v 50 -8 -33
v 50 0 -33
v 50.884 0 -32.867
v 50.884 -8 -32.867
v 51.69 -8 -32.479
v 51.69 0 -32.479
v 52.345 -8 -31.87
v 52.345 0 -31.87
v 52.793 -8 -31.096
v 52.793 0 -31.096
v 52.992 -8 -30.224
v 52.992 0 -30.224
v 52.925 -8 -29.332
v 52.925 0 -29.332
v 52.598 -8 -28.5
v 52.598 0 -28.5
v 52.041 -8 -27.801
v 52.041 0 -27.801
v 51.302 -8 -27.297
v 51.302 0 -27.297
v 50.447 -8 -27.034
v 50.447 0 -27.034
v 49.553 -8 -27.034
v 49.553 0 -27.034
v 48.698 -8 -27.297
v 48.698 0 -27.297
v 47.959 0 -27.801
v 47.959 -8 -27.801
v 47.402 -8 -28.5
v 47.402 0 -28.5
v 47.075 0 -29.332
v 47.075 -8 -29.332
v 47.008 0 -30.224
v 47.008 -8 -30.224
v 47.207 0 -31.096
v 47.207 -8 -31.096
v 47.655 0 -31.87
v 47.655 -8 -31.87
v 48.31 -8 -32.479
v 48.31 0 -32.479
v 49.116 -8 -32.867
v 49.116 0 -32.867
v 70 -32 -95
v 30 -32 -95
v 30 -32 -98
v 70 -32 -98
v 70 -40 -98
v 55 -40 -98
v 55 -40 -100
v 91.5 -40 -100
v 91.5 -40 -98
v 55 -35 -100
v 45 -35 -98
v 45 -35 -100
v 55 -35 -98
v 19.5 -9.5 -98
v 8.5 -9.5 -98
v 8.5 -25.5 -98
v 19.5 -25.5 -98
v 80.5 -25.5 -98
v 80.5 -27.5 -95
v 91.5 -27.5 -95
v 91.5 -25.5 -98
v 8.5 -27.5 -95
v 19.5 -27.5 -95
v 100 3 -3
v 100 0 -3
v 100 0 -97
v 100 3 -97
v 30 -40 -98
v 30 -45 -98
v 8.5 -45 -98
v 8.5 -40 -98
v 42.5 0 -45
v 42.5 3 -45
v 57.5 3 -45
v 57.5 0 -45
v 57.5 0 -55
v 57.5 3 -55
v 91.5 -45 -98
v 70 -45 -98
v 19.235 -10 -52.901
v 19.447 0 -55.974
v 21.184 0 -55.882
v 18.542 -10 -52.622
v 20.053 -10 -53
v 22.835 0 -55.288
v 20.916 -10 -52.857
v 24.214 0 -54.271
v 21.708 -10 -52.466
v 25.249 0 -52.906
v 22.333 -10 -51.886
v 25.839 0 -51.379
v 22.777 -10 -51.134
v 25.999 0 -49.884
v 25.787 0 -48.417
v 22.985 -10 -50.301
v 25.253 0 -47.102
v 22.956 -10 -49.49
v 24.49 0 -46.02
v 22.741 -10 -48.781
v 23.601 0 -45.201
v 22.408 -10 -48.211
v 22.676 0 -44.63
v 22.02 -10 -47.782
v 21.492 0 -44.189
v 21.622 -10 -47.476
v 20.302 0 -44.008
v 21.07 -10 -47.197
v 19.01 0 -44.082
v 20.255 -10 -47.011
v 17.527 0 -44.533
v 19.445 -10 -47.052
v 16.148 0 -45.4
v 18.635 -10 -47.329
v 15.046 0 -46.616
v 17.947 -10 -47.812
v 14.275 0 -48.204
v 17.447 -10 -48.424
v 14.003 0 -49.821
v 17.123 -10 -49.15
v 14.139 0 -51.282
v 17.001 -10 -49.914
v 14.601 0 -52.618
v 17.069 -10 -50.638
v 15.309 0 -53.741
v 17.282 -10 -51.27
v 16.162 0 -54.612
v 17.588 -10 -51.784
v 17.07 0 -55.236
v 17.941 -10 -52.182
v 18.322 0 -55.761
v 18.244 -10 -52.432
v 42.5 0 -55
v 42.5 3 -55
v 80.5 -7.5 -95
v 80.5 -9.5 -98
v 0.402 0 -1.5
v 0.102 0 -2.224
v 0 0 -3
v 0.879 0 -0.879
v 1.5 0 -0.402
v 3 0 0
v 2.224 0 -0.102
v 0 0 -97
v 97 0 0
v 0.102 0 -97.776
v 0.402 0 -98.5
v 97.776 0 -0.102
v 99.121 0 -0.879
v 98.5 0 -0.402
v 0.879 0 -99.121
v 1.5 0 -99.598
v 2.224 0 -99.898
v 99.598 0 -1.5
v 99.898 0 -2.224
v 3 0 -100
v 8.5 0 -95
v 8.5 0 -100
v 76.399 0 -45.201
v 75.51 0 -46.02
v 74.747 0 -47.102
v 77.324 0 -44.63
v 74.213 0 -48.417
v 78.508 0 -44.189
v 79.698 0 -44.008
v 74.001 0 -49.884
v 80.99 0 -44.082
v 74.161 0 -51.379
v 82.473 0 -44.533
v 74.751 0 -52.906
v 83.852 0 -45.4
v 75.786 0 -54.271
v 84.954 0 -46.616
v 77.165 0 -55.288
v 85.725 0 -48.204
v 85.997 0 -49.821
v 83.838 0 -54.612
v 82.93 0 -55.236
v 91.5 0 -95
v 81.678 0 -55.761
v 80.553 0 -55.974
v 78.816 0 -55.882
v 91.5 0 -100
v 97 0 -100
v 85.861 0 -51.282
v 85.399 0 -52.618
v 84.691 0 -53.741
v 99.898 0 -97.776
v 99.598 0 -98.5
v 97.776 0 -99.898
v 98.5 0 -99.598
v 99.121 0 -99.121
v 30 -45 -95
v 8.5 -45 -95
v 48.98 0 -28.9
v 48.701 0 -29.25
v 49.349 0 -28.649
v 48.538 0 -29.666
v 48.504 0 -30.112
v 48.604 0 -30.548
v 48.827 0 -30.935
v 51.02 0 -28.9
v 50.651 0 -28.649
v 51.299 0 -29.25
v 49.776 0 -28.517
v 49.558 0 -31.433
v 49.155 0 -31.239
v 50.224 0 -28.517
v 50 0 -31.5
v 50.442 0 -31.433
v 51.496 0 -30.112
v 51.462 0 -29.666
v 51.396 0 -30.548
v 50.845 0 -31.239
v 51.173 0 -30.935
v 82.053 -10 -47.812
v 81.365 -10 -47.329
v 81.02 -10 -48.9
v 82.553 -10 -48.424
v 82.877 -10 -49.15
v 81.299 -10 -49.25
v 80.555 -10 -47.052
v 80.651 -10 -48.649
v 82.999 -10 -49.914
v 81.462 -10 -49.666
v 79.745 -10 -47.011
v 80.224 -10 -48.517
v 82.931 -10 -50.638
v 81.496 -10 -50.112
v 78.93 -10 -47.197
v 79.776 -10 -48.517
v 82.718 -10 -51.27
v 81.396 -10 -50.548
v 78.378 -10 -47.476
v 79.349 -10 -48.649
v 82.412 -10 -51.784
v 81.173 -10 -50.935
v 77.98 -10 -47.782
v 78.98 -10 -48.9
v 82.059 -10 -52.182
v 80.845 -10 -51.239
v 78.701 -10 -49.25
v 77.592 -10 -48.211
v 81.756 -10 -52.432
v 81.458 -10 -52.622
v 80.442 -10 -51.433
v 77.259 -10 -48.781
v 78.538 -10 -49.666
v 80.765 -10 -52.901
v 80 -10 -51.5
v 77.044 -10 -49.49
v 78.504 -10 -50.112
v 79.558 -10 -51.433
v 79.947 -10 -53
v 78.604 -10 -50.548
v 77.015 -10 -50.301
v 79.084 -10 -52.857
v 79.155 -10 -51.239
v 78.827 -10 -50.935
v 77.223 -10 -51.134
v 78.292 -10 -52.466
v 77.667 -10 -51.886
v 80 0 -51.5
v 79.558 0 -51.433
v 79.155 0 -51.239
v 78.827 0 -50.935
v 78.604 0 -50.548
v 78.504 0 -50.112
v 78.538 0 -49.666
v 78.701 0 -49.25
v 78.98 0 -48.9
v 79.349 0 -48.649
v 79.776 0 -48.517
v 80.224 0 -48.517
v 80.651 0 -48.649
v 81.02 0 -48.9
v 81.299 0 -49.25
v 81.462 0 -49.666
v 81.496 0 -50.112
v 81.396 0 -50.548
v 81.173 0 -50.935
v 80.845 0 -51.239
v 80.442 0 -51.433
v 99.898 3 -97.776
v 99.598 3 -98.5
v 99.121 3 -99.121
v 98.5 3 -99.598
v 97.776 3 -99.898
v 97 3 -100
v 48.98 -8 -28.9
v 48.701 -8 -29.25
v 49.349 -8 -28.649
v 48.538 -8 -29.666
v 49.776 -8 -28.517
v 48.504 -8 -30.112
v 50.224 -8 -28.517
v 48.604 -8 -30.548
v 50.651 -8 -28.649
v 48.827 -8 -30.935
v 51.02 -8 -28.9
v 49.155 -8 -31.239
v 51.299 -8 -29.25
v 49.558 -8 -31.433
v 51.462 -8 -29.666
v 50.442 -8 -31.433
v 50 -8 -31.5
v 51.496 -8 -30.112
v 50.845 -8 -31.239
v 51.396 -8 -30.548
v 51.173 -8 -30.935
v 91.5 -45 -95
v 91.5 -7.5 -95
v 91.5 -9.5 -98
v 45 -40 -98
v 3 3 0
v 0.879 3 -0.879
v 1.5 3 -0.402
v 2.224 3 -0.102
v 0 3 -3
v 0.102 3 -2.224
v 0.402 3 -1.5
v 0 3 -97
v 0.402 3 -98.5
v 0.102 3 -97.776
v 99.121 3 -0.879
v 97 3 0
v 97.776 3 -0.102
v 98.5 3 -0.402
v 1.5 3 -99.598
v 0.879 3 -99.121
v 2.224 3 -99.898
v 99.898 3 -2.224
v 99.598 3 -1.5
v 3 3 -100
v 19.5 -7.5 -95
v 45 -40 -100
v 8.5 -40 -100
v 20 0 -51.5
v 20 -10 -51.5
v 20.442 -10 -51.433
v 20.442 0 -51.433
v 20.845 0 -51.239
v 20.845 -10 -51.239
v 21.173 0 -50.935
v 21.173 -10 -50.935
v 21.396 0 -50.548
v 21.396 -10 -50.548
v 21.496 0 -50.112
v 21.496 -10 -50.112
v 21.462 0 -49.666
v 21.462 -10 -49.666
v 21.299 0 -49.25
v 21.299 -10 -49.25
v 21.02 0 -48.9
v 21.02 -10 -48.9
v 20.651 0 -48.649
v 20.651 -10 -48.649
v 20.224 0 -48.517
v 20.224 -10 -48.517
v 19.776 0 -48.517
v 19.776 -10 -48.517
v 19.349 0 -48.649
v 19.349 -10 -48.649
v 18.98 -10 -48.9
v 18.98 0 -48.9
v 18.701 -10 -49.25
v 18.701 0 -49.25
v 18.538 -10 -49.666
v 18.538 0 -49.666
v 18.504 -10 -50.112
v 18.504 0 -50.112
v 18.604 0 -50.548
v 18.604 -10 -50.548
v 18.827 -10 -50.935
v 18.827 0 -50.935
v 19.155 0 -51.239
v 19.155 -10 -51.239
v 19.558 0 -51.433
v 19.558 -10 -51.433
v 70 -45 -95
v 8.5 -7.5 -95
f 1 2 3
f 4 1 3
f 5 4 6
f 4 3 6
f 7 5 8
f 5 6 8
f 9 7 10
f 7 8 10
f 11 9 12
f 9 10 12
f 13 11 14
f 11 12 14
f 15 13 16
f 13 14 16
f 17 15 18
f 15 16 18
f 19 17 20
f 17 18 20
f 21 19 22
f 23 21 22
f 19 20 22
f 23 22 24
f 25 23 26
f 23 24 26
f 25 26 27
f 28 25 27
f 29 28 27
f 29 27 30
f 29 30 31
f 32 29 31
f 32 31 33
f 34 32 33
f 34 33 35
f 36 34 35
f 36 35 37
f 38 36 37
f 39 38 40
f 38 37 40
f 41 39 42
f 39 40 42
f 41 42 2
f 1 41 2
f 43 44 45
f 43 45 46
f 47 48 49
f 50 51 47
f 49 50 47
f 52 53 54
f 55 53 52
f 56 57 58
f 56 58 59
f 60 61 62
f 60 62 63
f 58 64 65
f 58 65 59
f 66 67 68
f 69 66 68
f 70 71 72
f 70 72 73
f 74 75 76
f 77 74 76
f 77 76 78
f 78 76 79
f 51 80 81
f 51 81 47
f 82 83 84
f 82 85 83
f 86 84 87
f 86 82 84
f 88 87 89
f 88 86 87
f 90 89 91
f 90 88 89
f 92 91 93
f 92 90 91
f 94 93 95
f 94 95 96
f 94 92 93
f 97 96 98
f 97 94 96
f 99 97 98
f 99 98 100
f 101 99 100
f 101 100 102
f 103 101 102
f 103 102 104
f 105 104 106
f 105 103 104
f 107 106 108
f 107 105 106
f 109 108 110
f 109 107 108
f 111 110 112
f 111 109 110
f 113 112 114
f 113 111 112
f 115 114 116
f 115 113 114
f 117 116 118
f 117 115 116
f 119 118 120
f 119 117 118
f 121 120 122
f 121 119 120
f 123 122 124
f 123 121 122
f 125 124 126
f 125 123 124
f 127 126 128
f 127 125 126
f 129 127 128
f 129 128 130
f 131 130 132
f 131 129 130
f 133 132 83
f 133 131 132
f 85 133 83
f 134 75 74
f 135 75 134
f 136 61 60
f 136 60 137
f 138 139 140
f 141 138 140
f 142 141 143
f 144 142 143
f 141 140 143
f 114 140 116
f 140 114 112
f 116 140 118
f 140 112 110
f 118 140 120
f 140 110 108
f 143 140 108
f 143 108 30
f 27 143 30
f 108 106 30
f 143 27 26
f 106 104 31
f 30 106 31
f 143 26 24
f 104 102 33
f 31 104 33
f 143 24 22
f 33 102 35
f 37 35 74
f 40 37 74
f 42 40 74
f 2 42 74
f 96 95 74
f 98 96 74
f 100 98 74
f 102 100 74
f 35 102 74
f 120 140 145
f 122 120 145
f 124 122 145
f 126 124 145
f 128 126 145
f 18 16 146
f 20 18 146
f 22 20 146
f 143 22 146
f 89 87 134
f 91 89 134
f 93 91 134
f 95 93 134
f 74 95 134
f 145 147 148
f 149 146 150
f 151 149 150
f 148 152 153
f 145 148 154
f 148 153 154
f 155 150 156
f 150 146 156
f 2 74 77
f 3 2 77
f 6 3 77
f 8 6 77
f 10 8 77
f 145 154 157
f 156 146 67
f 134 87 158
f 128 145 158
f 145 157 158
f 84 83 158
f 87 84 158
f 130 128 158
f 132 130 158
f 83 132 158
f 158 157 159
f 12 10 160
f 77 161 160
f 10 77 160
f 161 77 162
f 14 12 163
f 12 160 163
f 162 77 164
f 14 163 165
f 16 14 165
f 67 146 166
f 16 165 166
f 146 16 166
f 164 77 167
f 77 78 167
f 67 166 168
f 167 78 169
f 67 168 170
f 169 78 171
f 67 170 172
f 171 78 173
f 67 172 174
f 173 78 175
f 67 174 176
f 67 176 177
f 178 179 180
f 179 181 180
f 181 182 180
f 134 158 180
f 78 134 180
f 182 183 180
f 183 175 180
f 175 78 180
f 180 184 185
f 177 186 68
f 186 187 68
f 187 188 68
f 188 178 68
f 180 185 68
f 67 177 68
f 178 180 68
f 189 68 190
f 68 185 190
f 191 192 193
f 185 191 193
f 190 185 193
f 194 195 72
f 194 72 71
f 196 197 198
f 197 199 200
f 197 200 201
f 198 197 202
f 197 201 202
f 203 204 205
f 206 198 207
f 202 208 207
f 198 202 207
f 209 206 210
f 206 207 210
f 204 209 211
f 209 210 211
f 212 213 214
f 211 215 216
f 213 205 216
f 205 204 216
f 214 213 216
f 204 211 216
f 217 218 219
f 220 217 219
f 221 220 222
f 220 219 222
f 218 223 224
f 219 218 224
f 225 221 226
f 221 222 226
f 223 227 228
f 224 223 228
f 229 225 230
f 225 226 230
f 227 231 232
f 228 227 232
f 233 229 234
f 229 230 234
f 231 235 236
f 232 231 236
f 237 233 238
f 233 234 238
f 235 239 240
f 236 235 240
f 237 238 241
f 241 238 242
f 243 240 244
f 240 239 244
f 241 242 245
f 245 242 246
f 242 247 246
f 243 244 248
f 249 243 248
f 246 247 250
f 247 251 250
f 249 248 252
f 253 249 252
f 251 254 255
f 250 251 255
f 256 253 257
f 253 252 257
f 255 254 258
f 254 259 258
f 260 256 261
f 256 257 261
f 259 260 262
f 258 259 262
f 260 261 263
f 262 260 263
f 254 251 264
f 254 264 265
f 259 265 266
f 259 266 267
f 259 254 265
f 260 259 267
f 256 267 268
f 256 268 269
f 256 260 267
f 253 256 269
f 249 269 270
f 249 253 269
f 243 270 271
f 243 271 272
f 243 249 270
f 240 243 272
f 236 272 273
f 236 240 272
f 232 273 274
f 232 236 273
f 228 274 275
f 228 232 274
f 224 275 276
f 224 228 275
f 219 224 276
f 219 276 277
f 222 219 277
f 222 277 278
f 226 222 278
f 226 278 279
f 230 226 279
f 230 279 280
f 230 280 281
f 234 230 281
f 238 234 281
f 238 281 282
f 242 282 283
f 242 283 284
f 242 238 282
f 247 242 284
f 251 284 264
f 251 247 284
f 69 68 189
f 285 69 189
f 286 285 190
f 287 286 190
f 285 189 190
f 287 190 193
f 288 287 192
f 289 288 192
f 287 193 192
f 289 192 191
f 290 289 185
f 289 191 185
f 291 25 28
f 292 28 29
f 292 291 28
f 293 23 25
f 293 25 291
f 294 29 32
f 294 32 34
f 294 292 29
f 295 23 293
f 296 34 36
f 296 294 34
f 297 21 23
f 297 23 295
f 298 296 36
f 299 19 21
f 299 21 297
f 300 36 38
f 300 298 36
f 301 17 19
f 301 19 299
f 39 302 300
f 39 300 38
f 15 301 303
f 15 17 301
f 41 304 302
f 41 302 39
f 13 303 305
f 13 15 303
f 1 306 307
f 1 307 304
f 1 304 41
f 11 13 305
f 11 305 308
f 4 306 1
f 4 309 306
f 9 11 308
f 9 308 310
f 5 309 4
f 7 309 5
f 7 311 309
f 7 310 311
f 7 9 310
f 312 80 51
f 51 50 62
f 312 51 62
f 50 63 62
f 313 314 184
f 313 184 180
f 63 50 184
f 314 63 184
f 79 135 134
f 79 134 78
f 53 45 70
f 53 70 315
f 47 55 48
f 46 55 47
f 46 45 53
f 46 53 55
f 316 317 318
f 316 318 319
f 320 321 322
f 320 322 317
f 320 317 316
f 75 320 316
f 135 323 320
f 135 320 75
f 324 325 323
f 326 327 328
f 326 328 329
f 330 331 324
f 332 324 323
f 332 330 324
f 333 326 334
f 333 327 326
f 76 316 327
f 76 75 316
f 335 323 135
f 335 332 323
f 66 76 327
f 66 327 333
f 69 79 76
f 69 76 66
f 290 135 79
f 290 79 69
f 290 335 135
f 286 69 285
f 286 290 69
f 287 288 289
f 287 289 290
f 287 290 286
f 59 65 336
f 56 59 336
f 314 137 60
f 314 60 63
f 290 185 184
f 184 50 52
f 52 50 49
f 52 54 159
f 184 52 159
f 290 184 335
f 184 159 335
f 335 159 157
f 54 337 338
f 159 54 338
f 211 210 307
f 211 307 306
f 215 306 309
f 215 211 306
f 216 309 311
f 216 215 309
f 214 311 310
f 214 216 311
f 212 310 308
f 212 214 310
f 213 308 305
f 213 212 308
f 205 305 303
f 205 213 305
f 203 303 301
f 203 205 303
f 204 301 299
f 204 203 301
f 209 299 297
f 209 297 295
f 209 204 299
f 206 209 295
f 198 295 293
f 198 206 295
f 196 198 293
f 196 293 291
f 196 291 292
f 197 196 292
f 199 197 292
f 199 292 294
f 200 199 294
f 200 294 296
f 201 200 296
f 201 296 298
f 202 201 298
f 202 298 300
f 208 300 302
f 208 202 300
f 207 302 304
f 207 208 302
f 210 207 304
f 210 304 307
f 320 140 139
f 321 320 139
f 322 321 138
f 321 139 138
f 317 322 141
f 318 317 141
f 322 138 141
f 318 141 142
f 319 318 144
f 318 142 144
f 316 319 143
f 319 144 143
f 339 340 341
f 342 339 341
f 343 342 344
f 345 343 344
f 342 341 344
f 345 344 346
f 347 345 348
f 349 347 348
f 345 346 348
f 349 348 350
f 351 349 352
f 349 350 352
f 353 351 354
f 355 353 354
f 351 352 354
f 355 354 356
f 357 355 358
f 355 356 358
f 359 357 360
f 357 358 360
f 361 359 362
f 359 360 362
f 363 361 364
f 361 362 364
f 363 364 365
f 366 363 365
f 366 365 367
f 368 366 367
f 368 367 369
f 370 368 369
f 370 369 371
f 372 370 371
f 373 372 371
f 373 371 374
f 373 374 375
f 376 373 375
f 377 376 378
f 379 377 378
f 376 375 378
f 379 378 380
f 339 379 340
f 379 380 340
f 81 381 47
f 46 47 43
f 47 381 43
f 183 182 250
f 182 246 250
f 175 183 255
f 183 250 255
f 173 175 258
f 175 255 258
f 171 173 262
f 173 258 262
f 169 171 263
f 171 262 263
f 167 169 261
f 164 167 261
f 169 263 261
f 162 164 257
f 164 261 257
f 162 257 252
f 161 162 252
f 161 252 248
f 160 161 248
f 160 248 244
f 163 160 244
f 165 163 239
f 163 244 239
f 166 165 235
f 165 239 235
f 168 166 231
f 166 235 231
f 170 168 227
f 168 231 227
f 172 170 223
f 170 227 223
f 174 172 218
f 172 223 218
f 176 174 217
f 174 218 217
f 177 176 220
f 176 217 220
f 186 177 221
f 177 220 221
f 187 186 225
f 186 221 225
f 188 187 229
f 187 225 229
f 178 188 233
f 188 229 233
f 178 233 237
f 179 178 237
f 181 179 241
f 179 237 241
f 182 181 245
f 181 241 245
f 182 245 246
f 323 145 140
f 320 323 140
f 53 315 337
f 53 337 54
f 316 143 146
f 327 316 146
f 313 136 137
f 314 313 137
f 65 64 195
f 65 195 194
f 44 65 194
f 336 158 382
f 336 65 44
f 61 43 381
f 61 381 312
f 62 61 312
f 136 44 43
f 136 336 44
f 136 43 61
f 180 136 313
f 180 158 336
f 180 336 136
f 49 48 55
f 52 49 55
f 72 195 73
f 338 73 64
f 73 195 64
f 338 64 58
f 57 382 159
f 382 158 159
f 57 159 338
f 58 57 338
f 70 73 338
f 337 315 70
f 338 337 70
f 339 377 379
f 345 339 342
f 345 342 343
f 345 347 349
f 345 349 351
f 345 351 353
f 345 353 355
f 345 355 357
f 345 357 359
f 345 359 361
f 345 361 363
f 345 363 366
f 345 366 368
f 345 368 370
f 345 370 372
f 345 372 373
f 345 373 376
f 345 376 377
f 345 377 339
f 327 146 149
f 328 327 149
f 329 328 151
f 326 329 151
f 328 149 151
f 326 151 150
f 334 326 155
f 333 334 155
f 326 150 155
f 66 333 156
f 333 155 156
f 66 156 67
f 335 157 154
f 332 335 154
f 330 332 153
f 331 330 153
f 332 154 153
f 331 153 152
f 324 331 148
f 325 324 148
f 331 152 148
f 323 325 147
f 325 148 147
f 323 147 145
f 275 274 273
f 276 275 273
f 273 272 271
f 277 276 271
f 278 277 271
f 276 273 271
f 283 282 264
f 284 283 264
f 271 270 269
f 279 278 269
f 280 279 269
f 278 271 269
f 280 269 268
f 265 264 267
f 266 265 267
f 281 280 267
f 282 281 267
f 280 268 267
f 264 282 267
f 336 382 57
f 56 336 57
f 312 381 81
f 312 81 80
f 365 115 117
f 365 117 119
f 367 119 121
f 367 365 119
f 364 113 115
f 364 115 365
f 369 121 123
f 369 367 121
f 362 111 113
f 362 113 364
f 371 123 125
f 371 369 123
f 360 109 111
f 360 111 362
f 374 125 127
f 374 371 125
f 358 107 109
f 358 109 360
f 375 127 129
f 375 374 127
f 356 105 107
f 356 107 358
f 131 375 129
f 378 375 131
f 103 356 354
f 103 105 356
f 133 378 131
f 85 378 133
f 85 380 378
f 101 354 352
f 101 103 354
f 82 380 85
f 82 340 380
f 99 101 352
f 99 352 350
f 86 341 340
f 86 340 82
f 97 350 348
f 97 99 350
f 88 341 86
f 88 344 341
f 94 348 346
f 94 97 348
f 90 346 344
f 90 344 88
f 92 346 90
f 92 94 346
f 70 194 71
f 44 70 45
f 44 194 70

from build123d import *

# Parameters (mm, degrees)
EXTRUDE_354_DEPTH      = 3
CUT_EXTRUDE_1082_REACH = 143.453
SKETCH_3_W             = 15
SKETCH_3_H             = 10
SKETCH_4_R             = 3
SKETCH_4_R_2           = 1.5
EXTRUDE_1381_DEPTH     = 8
SKETCH_5_W             = 83
SKETCH_5_H             = 5
EXTRUDE_1698_DEPTH     = 45
SKETCH_6_W             = 2
SKETCH_6_H             = 5
CUT_EXTRUDE_1867_DEPTH = 83
SKETCH_7_W             = 40
SKETCH_7_H             = 13
TYPE_C_DEPTH           = 3
SKETCH_8_W             = 10
SKETCH_8_H             = 5
CUT_EXTRUDE_3_DEPTH    = 2
SKETCH_9_W             = 11
SKETCH_9_H             = 20
CUT_EXTRUDE_4_DEPTH    = 3
EXTRUDE_START          = -83
EXTRUDE_1_DEPTH        = 83
SKETCH_2_3_R           = 1.5
CUT_EXTRUDE_5_DEPTH    = 10


with BuildPart() as part:
    # 草图1 → Extrude 354 (new body)
    with BuildSketch(Plane(origin=(0, 0, 0), x_dir=(1, 0, 0), z_dir=(0, 1, 0))):
        with BuildLine():
            Line((3, 0), (97, 0))
            ThreePointArc((97, 0), (99.121320344, 0.878679656), (100, 3))
            Line((100, 3), (100, 97))
            ThreePointArc((100, 97), (99.121320344, 99.121320344), (97, 100))
            Line((97, 100), (3, 100))
            ThreePointArc((3, 100), (0.878679656, 99.121320344), (0, 97))
            Line((0, 97), (0, 3))
            ThreePointArc((0, 3), (0.878679656, 0.878679656), (3, 0))
        make_face()
    extrude(amount=EXTRUDE_354_DEPTH)

    # 草图3 → Cut-Extrude 1082 (cut, up to next)
    with BuildSketch(Plane(origin=(0, 3, 0), x_dir=(1, 0, 0), z_dir=(0, 1, 0)), mode=Mode.PRIVATE) as cut_extrude_1082_sk1:
        with Locations((50, 50)):
            Rectangle(SKETCH_3_W, SKETCH_3_H)
    cut_extrude_1082_tool1 = extrude(cut_extrude_1082_sk1.sketch, amount=-CUT_EXTRUDE_1082_REACH, mode=Mode.PRIVATE) & part.part
    add(cut_extrude_1082_tool1.solids().sort_by_distance((50, 3, -50))[0], mode=Mode.SUBTRACT)

    # 草图4 → Extrude 1381 (add)
    with BuildSketch(Plane.XZ):
        with Locations(Location((50, -30, 0), (0, 0, 270))):
            Circle(SKETCH_4_R)
        with Locations(Location((50, -30, 0), (0, 0, 270))):
            Circle(SKETCH_4_R_2, mode=Mode.SUBTRACT)
    extrude(amount=EXTRUDE_1381_DEPTH)

    # 草图5 → Extrude 1698 (add)
    with BuildSketch(Plane.XZ):
        with Locations((50, -97.5)):
            Rectangle(SKETCH_5_W, SKETCH_5_H)
    extrude(amount=EXTRUDE_1698_DEPTH)

    # 草图6 → Cut-Extrude 1867 (cut)
    with BuildSketch(Plane(origin=(91.5, 0, 0), x_dir=(0, 0, -1), z_dir=(1, 0, 0))):
        with Locations((99, -42.5)):
            Rectangle(SKETCH_6_W, SKETCH_6_H)
    extrude(amount=-CUT_EXTRUDE_1867_DEPTH, mode=Mode.SUBTRACT)

    # 草图7 → TYPE-C板口 (cut)
    with BuildSketch(Plane.XY.offset(-95)):
        with Locations((50, -38.5)):
            Rectangle(SKETCH_7_W, SKETCH_7_H)
    extrude(amount=-TYPE_C_DEPTH, mode=Mode.SUBTRACT)

    # 草图8 → 切除-拉伸3 (cut)
    with BuildSketch(Plane.XY.offset(-98)):
        with Locations((50, -37.5)):
            Rectangle(SKETCH_8_W, SKETCH_8_H)
    extrude(amount=-CUT_EXTRUDE_3_DEPTH, mode=Mode.SUBTRACT)

    # 草图9 → 切除-拉伸4 (cut)
    with BuildSketch(Plane.XY.offset(-95)):
        with Locations((86, -17.5)):
            Rectangle(SKETCH_9_W, SKETCH_9_H)
        with Locations((14, -17.5)):
            Rectangle(SKETCH_9_W, SKETCH_9_H)
    extrude(amount=-CUT_EXTRUDE_4_DEPTH, mode=Mode.SUBTRACT)

    # 草图10 → 凸台-拉伸1 (add)
    with BuildSketch(Plane(origin=(91.5, 0, 0), x_dir=(0, 0, -1), z_dir=(1, 0, 0)).offset(EXTRUDE_START)):
        Polygon((95, -7.5), (98, -9.5), (98, -7.5), align=None)
        Polygon((95, -27.5), (98, -25.5), (98, -27.5), align=None)
    extrude(amount=EXTRUDE_1_DEPTH)

    # 放样2: read off the stored shape, not the designer's step
    # 放样2: loft between two sections, ruled curve by curve
    loft_2_from = [
        Edge.make_bspline([(19.446610657, 0, -55.974425515), (31.395461687, 0, -57.081204201), (32.502240373, 0, -45.132353171), (20.553389343, 0, -44.025574485), (8.604538313, 0, -42.918795799), (7.497759627, 0, -54.867646829), (19.446610657, 0, -55.974425515)], [0, 0, 0, 0, 0.5, 0.5, 0.5, 1, 1, 1, 1], 3, [1, 0.333333333, 0.333333333, 1, 0.333333333, 0.333333333, 1]),
    ]
    loft_2_to = [
        Edge.make_bspline([(18.541542898, -10, -52.621622185), (23.784787268, -10, -55.538536389), (26.701701472, -10, -50.295292019), (21.458457102, -10, -47.378377815), (16.215212732, -10, -44.461463611), (13.298298528, -10, -49.704707981), (18.541542898, -10, -52.621622185)], [0, 0, 0, 0, 0.5, 0.5, 0.5, 1, 1, 1, 1], 3, [1, 0.333333333, 0.333333333, 1, 0.333333333, 0.333333333, 1]),
    ]
    loft_2 = Solid(Shell([*[Face.make_surface_from_curves(loft_2_from[k], loft_2_to[k]) for k in range(1)], Face(Wire(loft_2_from)), Face(Wire(loft_2_to))]))
    add(loft_2)

    # 草图2<3> → 切除-拉伸5 (cut)
    with BuildSketch(Plane.XZ.offset(10)):
        with Locations(Location((20, -50, 0), (0, 0, 270))):
            Circle(SKETCH_2_3_R)
    cut_extrude_5 = extrude(amount=-CUT_EXTRUDE_5_DEPTH, mode=Mode.SUBTRACT)

    # 镜向1: 放样2, 切除-拉伸5 across plane
    add(loft_2.mirror(Plane.ZY.offset(-50)))
    add(cut_extrude_5.mirror(Plane.ZY.offset(-50)), mode=Mode.SUBTRACT)


solid = part.part
